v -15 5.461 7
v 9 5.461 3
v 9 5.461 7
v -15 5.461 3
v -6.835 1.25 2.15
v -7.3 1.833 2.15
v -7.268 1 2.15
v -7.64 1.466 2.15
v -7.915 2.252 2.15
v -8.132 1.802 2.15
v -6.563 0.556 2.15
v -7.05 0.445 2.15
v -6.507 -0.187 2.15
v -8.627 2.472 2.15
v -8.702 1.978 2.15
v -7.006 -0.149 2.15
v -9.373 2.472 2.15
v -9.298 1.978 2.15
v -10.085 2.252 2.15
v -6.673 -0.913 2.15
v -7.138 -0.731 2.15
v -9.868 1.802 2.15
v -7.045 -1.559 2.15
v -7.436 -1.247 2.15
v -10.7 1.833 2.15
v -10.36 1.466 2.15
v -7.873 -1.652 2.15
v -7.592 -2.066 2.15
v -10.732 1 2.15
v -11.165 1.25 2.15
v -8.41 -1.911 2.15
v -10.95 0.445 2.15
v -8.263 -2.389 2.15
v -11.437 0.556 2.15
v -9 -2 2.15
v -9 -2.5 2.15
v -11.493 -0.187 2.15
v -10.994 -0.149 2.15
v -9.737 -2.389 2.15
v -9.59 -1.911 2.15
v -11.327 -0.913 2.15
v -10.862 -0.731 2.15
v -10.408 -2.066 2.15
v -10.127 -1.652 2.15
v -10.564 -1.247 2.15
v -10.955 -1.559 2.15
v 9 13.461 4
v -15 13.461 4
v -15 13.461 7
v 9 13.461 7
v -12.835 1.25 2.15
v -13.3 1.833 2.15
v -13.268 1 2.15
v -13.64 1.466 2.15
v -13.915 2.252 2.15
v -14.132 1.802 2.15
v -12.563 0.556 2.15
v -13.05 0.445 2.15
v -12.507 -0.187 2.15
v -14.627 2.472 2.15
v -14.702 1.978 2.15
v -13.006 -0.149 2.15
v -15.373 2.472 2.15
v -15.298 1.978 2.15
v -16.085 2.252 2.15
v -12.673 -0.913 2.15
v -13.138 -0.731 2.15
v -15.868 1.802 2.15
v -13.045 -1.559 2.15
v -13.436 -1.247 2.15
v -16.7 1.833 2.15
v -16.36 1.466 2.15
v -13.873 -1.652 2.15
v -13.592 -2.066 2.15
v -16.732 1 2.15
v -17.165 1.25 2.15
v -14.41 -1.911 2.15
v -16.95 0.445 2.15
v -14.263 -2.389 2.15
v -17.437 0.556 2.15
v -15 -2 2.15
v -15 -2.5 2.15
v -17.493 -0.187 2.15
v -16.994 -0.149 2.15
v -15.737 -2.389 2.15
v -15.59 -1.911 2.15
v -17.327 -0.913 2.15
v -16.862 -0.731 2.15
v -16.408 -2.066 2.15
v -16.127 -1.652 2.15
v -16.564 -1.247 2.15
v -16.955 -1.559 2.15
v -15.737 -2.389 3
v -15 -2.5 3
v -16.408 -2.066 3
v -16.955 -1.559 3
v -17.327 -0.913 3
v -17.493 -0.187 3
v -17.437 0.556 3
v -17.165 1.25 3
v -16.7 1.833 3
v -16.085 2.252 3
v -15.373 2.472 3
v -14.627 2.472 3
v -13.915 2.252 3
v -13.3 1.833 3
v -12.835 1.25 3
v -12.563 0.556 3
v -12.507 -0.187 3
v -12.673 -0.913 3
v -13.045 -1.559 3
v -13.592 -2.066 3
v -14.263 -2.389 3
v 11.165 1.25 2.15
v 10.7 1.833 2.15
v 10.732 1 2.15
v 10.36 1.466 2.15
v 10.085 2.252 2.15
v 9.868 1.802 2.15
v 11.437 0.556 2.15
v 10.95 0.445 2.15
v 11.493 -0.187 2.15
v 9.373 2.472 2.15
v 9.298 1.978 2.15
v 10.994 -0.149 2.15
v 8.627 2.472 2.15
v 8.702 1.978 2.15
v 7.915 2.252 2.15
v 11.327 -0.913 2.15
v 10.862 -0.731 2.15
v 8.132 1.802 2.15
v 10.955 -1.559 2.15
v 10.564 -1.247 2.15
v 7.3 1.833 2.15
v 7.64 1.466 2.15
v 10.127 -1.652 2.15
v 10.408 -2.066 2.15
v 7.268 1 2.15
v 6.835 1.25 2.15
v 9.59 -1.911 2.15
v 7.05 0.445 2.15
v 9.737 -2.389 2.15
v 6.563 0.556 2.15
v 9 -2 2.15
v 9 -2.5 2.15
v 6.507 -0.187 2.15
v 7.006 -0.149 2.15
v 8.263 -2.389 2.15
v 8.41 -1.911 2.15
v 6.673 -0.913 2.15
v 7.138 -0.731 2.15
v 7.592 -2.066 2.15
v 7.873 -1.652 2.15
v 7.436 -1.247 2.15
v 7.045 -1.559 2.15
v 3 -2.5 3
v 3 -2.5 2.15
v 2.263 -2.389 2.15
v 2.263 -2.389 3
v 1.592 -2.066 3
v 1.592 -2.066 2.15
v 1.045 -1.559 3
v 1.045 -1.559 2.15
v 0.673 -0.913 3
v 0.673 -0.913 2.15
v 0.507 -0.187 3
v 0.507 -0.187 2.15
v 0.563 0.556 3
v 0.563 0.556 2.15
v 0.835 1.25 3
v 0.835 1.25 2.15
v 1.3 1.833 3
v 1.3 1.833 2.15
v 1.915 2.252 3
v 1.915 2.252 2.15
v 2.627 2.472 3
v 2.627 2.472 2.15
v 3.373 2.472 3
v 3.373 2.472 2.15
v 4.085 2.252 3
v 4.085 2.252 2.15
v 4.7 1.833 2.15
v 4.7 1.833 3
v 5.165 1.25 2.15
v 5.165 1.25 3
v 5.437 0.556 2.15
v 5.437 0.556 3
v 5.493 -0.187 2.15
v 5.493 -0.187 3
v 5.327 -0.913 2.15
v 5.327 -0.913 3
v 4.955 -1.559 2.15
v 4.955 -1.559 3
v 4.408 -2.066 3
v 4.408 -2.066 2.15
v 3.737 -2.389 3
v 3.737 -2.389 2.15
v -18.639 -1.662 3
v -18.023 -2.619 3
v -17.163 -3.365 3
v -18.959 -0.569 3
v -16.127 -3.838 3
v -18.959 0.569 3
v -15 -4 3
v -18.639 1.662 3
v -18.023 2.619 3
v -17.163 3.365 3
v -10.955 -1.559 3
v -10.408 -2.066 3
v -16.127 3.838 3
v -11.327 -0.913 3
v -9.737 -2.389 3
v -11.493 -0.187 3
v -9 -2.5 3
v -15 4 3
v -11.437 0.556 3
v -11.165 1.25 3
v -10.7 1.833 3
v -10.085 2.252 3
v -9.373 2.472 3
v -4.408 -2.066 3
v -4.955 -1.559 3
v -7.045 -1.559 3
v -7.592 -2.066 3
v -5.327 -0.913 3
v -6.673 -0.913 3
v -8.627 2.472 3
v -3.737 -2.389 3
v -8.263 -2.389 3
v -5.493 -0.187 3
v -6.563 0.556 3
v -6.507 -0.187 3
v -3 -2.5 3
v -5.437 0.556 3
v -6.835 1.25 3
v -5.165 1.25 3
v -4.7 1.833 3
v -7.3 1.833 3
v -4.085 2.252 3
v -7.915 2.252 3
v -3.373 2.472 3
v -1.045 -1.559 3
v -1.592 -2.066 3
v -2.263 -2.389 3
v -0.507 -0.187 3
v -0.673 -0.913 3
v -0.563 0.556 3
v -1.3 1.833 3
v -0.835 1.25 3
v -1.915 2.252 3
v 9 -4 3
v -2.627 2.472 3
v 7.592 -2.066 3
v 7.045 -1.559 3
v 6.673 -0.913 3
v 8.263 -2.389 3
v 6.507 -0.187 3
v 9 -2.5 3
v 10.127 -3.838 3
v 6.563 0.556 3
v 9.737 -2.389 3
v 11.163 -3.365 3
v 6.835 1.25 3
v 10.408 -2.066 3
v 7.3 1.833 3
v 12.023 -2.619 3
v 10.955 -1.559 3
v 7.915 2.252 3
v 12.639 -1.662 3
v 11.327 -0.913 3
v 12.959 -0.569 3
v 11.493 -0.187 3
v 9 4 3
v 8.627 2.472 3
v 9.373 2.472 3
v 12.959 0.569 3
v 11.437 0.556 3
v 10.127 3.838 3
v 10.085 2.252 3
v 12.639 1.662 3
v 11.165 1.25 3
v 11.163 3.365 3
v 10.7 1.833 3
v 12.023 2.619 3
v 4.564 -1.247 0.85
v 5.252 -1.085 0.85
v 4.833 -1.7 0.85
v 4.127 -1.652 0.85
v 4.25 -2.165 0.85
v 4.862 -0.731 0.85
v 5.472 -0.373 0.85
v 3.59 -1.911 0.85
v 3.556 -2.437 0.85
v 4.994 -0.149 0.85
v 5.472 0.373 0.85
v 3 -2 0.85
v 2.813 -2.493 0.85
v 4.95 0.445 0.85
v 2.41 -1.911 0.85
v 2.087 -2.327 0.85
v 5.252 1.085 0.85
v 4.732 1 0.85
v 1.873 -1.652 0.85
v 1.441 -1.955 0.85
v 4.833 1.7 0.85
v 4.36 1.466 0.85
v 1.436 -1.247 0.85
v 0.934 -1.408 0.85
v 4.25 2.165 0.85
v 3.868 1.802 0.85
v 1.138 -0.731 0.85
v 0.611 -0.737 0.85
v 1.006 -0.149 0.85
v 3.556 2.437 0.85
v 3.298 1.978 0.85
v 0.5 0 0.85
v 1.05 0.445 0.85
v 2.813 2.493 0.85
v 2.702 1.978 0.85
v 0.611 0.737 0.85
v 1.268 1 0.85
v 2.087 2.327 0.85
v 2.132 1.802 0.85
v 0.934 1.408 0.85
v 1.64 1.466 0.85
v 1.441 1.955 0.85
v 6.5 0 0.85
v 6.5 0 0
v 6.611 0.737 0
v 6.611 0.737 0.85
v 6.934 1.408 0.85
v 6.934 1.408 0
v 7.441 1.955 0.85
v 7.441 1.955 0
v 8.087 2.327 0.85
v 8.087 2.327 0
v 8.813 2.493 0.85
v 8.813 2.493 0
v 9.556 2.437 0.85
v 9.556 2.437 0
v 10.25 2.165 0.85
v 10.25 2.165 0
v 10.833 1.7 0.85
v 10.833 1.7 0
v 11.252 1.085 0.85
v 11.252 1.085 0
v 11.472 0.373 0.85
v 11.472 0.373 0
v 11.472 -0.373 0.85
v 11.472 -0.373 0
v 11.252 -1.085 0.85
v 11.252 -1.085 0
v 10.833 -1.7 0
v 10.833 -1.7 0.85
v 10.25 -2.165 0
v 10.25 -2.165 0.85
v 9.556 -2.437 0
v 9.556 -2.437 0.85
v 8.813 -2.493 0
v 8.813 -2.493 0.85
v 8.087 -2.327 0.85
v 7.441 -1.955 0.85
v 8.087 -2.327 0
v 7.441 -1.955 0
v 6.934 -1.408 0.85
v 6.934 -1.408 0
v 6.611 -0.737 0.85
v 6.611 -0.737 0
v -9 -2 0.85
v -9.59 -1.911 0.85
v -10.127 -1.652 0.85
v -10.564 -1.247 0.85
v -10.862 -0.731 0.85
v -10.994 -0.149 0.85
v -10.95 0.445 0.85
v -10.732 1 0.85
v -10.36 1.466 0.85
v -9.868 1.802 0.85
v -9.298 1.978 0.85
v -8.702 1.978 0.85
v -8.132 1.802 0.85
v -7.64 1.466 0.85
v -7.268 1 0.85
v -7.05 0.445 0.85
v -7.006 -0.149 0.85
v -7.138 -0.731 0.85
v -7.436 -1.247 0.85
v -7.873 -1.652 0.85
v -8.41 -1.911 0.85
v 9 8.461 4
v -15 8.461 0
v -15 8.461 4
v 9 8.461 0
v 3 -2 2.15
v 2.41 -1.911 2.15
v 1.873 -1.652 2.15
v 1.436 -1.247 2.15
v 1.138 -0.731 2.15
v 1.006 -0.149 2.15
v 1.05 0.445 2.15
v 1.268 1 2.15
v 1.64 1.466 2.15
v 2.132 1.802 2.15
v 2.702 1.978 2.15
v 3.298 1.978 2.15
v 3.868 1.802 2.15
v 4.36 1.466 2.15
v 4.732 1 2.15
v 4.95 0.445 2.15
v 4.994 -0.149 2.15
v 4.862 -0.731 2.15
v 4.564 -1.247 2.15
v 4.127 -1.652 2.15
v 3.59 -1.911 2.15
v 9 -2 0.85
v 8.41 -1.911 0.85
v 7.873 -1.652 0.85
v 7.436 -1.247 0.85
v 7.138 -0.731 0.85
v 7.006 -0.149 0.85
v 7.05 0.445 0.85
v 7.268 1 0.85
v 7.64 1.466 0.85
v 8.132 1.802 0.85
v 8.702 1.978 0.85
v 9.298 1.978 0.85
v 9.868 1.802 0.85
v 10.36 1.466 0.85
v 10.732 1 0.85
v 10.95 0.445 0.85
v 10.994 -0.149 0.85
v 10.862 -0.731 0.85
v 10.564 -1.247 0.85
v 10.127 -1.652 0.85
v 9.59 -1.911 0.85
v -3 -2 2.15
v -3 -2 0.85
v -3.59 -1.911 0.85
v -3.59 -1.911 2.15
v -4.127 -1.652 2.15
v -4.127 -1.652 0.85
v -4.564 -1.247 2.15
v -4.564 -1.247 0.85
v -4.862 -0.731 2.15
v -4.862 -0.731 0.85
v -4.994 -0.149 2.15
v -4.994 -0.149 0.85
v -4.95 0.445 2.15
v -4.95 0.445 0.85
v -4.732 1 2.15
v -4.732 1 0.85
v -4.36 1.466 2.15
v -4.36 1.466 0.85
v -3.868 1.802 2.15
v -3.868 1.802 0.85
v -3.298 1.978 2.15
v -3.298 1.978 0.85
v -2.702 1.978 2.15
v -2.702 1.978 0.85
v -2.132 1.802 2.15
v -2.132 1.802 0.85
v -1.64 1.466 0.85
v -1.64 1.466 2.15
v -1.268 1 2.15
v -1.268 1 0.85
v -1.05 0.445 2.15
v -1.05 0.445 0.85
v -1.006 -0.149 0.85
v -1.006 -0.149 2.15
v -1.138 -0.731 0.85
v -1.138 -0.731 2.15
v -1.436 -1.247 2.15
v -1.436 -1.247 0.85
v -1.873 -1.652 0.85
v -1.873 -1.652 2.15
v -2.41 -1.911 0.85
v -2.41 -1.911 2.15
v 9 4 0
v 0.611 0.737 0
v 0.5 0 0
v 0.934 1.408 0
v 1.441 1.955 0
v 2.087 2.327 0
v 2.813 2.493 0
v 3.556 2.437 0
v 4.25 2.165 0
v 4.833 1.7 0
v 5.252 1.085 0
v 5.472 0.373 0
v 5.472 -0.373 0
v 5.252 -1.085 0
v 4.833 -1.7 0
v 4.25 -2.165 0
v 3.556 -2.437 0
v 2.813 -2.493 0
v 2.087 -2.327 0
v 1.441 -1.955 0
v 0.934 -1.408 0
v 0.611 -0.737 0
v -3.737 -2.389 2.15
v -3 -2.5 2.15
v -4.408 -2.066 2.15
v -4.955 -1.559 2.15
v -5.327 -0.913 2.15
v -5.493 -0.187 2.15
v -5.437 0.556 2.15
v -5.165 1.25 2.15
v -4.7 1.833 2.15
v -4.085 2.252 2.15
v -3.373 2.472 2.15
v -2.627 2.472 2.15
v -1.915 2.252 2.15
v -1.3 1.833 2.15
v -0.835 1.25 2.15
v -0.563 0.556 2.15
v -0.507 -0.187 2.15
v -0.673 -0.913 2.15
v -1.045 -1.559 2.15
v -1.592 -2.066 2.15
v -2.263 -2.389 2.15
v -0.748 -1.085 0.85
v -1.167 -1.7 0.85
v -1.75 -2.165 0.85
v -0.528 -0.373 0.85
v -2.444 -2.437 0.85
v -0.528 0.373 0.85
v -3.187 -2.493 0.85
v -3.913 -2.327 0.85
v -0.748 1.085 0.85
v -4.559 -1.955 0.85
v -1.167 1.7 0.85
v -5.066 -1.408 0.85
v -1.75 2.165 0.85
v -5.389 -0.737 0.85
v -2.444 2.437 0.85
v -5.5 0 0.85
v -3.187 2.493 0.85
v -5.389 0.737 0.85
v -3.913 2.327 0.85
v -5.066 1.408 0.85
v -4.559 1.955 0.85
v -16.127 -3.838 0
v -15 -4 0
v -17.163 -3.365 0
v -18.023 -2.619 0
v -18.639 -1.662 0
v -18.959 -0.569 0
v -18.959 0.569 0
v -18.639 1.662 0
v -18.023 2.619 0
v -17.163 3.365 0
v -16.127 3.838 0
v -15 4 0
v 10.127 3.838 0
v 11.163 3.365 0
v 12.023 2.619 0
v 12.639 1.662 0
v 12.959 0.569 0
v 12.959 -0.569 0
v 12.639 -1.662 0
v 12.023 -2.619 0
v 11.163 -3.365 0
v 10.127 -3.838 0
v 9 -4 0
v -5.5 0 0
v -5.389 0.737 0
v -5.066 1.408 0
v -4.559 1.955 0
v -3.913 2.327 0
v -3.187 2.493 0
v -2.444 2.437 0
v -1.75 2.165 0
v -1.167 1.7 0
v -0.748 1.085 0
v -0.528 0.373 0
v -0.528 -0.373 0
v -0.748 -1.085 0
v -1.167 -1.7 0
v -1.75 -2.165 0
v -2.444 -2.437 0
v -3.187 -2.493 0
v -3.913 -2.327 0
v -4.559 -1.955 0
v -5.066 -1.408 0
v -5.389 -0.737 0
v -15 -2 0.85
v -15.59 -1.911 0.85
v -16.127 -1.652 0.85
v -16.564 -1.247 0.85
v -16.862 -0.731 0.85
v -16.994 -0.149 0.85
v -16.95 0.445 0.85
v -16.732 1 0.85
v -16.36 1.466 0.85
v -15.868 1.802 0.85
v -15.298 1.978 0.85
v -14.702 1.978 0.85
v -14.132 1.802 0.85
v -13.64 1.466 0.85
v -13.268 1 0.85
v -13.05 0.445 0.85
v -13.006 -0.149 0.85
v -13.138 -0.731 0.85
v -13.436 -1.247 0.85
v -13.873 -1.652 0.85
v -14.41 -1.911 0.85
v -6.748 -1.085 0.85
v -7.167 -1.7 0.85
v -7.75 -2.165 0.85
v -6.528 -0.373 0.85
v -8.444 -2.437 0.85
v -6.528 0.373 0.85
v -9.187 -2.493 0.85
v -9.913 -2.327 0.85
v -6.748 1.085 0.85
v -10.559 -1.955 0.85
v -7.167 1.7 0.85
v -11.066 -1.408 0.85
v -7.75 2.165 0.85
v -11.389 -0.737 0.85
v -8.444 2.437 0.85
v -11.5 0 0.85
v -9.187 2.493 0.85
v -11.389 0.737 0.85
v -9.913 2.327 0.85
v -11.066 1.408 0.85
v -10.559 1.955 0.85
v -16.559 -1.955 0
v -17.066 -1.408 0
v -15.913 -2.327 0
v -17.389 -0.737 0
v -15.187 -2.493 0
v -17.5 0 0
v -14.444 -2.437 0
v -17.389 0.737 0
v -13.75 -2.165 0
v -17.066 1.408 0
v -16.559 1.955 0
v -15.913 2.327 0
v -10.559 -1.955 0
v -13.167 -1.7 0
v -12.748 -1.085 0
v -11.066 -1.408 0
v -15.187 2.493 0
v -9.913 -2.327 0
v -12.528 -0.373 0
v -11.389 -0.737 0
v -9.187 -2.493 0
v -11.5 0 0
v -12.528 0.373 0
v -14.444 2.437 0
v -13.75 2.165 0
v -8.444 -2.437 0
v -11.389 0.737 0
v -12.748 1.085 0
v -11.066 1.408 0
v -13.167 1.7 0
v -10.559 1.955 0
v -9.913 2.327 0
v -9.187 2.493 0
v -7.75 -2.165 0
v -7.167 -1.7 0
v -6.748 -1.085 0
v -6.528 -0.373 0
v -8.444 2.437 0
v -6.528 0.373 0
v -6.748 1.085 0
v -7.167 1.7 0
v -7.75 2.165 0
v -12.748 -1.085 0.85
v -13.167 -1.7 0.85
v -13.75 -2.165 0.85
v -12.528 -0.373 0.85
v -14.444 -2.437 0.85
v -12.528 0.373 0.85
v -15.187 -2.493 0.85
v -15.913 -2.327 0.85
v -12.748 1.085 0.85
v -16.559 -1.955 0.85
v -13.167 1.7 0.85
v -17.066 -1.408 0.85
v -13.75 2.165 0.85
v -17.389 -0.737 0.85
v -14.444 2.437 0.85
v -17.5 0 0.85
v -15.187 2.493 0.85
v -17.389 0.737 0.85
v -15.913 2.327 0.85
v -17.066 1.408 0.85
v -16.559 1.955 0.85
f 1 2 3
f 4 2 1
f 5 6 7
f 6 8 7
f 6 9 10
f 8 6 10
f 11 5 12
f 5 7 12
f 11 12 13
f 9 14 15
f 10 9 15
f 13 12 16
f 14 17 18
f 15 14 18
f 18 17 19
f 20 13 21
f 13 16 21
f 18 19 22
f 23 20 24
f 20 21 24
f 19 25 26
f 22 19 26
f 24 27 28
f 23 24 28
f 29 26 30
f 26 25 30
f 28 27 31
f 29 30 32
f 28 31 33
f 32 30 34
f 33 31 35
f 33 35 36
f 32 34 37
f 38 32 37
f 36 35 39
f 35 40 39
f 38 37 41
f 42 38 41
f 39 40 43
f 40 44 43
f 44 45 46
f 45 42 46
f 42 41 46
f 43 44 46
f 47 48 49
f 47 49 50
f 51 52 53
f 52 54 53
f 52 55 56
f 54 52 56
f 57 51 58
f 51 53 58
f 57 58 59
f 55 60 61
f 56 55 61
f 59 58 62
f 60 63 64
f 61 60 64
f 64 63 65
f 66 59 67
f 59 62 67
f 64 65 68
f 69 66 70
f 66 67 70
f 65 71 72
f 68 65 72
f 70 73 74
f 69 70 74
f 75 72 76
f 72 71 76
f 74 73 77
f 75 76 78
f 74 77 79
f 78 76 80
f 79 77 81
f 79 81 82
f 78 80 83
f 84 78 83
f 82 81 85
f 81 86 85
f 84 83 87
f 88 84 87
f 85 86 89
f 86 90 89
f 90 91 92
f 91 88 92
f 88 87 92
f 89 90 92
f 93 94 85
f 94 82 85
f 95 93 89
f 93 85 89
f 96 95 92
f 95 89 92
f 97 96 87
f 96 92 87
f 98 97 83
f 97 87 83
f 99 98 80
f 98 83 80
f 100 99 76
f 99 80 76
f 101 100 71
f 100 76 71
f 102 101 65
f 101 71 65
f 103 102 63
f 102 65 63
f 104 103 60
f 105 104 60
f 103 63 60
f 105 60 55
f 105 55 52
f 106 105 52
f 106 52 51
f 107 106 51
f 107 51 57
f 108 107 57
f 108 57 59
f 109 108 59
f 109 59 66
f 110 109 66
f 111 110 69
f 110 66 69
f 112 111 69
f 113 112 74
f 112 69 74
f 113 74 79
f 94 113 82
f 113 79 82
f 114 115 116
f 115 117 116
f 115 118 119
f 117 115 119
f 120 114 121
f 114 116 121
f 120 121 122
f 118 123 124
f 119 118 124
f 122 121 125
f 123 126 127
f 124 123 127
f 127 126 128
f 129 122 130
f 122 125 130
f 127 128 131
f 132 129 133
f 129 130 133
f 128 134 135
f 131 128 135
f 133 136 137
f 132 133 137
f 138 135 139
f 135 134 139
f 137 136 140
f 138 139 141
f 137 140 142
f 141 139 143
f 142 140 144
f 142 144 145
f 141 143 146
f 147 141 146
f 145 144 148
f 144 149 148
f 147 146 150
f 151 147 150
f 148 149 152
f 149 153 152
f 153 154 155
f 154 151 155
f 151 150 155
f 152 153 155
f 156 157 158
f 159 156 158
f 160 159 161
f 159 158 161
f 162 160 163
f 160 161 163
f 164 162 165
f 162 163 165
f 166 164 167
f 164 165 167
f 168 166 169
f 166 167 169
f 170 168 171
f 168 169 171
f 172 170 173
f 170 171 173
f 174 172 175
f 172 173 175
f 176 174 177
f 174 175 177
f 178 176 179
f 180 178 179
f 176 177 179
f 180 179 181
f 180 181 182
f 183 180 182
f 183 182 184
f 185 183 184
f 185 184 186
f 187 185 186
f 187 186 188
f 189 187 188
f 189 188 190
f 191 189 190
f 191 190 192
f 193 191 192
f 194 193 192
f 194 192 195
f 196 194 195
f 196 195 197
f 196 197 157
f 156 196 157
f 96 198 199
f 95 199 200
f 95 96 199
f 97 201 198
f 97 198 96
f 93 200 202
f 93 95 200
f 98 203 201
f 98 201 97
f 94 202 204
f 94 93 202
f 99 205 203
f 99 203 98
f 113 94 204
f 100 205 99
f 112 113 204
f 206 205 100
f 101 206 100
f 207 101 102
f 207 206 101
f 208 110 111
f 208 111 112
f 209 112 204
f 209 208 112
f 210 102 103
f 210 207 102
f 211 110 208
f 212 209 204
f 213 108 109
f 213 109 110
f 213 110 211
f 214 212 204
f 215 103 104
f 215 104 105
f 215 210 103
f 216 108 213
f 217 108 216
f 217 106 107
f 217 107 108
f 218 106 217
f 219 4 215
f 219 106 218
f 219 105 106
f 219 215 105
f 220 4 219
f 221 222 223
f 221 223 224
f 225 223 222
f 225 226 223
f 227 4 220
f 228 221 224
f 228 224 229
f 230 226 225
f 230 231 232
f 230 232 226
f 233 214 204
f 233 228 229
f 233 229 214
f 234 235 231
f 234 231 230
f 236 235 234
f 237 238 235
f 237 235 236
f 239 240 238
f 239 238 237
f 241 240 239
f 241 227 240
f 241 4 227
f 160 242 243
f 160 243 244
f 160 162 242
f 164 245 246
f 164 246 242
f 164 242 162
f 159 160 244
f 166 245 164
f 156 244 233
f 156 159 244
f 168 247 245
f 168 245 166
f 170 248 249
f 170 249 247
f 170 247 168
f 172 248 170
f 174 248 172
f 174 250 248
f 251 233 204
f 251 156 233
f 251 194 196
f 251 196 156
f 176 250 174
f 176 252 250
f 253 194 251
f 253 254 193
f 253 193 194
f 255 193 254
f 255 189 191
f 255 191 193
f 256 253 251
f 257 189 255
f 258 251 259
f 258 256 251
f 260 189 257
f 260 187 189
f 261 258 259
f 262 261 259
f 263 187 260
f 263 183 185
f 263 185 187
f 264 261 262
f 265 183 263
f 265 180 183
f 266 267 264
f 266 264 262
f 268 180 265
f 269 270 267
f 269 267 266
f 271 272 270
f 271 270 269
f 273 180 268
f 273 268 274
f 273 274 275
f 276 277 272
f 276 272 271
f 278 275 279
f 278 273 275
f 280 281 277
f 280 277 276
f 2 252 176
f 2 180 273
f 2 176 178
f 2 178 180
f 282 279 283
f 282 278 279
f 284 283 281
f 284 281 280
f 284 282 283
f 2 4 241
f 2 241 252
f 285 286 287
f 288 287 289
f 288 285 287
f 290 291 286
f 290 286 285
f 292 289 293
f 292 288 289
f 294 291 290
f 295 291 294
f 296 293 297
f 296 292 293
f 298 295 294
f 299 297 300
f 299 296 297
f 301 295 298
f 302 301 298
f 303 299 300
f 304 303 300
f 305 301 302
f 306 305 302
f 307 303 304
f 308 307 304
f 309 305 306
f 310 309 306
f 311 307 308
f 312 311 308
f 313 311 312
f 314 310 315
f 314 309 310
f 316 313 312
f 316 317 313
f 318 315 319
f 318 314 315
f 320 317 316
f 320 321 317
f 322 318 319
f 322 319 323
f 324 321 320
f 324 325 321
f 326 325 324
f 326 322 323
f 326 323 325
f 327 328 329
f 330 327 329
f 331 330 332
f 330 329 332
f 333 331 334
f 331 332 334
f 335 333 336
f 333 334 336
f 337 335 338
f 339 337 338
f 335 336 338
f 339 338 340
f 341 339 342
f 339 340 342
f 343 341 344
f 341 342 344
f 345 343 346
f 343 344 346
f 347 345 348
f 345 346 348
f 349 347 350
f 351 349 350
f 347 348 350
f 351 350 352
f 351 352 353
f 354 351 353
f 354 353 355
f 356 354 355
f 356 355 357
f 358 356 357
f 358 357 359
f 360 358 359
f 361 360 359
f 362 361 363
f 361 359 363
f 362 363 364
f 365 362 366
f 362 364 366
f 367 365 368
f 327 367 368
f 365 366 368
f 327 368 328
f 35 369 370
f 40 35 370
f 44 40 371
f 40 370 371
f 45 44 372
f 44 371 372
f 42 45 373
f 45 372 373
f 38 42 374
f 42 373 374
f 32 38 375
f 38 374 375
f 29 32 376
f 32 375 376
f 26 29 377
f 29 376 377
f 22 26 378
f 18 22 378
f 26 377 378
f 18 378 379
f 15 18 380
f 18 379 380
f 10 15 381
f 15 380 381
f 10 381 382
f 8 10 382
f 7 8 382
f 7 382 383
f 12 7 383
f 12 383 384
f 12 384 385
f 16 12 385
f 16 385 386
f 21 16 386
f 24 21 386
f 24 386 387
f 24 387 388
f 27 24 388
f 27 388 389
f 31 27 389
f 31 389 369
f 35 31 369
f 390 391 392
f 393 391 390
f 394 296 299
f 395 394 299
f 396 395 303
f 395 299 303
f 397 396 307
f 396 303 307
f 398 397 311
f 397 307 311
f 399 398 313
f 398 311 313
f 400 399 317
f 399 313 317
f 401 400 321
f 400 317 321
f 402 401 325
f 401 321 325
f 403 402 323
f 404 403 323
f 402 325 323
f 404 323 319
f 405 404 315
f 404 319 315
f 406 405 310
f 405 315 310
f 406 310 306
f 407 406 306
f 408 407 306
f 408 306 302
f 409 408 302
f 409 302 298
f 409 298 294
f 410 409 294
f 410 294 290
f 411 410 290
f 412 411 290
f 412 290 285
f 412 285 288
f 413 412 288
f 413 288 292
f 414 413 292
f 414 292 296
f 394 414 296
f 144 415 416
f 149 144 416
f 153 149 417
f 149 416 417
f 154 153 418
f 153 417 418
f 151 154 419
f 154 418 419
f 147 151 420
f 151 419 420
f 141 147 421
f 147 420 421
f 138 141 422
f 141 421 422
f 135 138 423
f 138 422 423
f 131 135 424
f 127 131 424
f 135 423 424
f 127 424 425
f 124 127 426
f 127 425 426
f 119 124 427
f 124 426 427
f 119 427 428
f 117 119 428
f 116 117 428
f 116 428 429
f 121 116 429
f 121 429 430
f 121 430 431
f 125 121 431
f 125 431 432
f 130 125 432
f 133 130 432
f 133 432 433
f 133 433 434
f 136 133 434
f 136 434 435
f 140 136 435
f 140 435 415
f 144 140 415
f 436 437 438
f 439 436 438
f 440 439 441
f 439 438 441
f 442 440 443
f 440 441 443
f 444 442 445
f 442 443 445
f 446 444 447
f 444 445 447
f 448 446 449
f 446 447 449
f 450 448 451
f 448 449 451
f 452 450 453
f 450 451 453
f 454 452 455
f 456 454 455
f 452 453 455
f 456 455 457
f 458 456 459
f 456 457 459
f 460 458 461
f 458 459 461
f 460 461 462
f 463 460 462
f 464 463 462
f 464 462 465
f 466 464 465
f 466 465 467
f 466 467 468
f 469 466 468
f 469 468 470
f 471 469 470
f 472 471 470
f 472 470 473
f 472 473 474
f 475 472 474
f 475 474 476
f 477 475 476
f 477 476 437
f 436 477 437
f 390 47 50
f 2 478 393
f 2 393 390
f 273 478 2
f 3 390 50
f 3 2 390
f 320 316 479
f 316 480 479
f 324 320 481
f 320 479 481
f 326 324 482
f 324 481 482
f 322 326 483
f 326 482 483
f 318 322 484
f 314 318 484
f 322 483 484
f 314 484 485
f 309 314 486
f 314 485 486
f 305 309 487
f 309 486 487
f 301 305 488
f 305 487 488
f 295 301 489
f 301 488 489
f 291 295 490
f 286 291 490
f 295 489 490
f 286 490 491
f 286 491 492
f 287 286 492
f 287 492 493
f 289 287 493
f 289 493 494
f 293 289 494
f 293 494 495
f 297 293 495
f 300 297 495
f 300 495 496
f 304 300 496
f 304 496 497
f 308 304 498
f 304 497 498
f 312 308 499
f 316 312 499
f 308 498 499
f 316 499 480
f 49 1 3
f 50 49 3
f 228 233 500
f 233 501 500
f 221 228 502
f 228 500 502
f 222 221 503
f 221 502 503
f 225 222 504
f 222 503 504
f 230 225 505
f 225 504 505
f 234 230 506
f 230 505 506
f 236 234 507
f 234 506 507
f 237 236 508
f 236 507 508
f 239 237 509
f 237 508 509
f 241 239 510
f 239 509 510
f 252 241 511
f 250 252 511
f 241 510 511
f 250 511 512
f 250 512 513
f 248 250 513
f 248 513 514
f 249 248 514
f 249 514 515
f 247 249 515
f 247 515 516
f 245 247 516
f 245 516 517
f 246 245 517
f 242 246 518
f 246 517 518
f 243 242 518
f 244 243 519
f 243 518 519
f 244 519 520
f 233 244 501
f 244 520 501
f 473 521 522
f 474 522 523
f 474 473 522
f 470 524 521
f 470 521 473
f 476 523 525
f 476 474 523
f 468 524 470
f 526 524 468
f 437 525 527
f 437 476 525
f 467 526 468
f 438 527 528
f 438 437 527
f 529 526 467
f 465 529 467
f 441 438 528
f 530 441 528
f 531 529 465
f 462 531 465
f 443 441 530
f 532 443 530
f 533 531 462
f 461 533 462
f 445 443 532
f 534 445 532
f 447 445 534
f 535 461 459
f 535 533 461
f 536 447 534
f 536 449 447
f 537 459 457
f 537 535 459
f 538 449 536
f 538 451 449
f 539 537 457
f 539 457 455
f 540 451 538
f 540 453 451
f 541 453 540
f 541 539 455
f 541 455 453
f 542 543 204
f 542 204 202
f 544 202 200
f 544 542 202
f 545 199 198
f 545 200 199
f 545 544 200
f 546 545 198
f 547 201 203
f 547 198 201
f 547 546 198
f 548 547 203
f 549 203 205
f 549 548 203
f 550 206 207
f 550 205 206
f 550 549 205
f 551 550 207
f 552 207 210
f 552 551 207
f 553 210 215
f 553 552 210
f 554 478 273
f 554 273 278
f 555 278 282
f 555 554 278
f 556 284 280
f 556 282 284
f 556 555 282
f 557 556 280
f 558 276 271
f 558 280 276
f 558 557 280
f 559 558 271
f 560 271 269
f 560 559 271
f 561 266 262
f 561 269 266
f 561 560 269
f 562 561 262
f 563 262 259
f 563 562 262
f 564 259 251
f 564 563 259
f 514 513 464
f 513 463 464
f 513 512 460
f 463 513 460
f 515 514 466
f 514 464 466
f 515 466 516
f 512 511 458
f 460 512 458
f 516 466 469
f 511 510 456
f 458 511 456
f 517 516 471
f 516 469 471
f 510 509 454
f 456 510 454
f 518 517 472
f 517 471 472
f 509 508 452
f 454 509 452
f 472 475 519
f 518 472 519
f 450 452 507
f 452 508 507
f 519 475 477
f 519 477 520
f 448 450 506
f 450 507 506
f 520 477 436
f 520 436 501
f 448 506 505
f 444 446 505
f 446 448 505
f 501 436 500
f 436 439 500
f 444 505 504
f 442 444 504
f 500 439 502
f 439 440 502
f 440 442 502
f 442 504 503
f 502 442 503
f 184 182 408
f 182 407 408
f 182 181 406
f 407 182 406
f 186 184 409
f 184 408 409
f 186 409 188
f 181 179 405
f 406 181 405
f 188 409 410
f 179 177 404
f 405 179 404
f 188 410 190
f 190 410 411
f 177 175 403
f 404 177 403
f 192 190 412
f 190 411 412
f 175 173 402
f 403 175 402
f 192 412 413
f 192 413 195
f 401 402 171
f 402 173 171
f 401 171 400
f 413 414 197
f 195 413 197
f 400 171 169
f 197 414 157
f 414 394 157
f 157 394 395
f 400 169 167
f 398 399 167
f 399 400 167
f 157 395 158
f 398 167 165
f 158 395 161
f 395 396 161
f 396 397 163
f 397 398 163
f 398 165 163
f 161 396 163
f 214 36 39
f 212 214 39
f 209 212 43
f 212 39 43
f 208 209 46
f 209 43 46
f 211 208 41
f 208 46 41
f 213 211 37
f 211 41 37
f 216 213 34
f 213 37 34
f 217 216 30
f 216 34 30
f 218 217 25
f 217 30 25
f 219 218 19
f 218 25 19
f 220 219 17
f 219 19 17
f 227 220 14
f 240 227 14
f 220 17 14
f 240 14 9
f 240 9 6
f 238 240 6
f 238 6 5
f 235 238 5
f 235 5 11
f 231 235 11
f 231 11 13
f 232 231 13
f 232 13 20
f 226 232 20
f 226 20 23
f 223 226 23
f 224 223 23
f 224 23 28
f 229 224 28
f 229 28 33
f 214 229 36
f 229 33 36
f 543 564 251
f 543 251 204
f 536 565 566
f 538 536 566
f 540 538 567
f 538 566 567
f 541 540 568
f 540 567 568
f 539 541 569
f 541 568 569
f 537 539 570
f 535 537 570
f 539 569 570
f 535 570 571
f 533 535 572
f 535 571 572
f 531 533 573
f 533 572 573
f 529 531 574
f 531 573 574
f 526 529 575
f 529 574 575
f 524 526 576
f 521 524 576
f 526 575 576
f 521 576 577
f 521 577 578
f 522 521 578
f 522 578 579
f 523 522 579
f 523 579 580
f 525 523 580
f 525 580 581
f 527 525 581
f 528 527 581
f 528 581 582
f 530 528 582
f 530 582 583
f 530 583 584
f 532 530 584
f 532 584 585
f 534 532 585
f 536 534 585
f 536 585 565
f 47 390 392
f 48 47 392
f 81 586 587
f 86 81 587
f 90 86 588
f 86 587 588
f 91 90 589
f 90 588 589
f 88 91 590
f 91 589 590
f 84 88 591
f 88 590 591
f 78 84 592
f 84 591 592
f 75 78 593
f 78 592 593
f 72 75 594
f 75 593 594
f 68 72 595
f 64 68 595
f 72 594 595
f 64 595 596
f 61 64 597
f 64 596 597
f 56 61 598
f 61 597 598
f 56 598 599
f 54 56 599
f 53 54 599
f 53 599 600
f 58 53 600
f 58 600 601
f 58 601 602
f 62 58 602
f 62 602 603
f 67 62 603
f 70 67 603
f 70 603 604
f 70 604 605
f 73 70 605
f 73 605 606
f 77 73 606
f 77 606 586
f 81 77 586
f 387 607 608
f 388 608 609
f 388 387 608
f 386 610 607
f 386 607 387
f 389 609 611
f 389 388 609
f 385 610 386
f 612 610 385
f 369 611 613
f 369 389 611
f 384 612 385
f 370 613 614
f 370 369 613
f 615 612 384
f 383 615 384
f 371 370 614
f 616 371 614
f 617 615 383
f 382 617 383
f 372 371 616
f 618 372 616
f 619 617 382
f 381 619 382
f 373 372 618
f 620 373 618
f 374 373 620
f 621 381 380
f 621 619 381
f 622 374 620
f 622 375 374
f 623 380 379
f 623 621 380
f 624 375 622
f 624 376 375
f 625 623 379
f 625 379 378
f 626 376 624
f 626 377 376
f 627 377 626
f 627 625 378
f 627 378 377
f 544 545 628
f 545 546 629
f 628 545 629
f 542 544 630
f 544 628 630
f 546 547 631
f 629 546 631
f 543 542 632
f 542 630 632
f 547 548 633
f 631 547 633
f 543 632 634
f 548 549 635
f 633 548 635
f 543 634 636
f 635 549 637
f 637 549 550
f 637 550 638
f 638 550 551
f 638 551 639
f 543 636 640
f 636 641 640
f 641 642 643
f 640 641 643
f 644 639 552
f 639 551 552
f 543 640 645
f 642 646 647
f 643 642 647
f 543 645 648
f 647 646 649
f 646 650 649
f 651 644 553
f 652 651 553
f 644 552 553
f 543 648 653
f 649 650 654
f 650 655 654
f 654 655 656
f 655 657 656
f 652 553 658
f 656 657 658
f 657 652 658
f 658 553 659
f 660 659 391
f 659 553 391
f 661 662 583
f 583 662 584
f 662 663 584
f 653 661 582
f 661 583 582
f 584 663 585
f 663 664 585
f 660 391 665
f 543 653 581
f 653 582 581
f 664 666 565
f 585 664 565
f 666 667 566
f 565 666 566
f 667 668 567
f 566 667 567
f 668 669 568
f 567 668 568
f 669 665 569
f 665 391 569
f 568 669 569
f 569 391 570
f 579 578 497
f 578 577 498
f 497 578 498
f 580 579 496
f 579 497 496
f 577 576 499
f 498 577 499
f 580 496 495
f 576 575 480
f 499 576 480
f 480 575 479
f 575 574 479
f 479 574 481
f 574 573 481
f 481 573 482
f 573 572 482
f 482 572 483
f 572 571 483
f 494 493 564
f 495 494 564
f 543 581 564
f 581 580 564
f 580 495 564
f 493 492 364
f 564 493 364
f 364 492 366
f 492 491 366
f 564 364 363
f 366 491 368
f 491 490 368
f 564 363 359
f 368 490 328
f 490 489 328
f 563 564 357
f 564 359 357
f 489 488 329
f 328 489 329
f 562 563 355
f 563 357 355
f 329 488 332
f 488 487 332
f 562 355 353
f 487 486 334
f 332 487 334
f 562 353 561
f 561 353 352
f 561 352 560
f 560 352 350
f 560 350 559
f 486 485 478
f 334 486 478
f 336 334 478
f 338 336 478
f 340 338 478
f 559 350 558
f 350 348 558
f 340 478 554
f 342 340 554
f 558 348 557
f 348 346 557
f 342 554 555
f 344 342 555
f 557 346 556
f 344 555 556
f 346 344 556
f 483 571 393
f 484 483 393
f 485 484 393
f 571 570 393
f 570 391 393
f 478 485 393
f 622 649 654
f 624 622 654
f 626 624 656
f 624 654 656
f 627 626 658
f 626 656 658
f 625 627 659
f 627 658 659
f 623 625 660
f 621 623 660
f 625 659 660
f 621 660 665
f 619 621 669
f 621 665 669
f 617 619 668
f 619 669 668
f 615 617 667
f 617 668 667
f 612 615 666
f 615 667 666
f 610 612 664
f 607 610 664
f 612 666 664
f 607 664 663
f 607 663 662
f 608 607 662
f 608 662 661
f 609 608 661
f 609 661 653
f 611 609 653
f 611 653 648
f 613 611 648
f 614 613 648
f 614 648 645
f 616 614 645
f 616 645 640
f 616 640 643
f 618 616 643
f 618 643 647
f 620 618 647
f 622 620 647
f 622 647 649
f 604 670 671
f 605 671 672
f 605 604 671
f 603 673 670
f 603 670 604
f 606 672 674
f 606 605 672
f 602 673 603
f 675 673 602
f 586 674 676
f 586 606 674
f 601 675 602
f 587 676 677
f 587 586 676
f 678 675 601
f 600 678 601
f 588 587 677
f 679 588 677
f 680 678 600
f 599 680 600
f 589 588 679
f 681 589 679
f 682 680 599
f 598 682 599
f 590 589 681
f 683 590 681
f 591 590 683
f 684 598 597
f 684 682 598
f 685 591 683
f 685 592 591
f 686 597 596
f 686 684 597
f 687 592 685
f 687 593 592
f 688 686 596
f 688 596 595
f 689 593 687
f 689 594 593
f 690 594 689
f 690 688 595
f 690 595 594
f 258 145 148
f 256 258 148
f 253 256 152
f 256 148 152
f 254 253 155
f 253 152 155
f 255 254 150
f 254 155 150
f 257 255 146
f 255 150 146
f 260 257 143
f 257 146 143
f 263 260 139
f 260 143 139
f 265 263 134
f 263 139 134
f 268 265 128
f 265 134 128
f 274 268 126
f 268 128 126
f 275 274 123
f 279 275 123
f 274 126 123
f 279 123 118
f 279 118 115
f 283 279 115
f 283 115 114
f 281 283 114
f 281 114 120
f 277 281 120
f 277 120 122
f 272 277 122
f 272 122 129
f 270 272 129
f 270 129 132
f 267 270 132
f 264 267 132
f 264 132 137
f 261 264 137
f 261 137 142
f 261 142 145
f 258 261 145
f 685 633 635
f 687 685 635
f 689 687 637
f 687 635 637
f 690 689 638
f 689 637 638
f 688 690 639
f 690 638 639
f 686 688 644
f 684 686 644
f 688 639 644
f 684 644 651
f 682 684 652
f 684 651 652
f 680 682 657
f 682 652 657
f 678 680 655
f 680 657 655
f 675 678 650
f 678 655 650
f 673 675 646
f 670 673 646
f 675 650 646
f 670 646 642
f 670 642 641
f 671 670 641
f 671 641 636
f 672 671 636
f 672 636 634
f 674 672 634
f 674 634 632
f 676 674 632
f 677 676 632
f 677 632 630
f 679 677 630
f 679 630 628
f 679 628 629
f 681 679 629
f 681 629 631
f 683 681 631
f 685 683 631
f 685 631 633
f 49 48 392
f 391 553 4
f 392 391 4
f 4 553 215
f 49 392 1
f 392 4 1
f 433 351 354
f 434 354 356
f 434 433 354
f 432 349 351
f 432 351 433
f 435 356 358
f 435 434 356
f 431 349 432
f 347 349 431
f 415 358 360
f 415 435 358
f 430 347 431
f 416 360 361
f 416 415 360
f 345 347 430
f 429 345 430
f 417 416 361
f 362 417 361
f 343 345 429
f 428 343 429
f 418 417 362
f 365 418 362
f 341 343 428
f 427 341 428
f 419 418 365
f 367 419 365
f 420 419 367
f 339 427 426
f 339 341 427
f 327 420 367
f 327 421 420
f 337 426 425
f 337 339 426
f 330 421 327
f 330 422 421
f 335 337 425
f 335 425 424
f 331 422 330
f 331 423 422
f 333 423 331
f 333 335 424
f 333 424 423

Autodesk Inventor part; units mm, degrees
ref_plane "YZ Plane" through (0, 0, 0) normal (1, 0, 0) x (0, 1, 0)
ref_plane "XZ Plane" through (0, 0, 0) normal (0, 1, 0) x (-1, 0, 0)
ref_plane "XY Plane" through (0, 0, 0) normal (0, 0, 1) x (1, 0, 0)
sketch "Sketch1" plane through (0, 0, 0) normal (0, 0, 1) x (1, 0, 0)
  arc A0 (-15, 4) -> (-15, -4) centre (-15, 0) ccw
  line L0 (-5, -4) -> (-15, -4)
  line L1 (-3, 0) -> (-3, 5.2247) construction
  arc A1 (9, -4) -> (9, 4) centre (9, 0) ccw
  line L2 (-5, -4) -> (9, -4)
  line L3 (9, 8.4612) -> (-15, 8.4612)
  line L4 (-15, 8.4612) -> (-15, 4)
  line L5 (9, 4) -> (9, 8.4612)
  dimension "d11" = 4
extrude "Extrusion1" add sketch "Sketch1" along normal blind 3
sketch "Sketch2" plane through (0, 0, 3) normal (0, 0, 1) x (1, 0, 0)
  arc A0 (-15, 4) -> (-15, -4) centre (-15, 0) ccw projected
  point P0 (0, 0)
hole "Hole1" at (-15, 0, 3) direction (0, 0, -1) diameter 4 depth 3 tip angle 118 counterbore diameter 5 counterbore depth 0.85
sketch "Sketch5" plane through (0, 0, 0) normal (0, 0, -1) x (-1, 0, 0)
  circle A0 centre (15, 0) radius 2 projected
  circle A1 centre (15, 0) radius 2.5
  point P0 (0, 0)
extrude "Extrusion3" cut sketch "Sketch5" against normal blind 0.85
pattern_linear "Rectangular Pattern2" count 5 spacing 6 along (1, 0, 0) of "Extrusion3", "Hole1"
sketch "Sketch6" plane through (0, 0, 3) normal (0, 0, 1) x (1, 0, 0)
  point P0 (0, 0)
sketch "Sketch7" plane through (0, 0, 3) normal (0, 0, 1) x (1, 0, 0)
  line L0 (9, 4) -> (9, 8.4612) projected
  line L1 (-15, 8.4612) -> (9, 8.4612)
  line L2 (9, 8.4612) -> (9, 5.4612)
  line L3 (9, 5.4612) -> (-15, 5.4612)
  line L4 (-15, 5.4612) -> (-15, 8.4612)
  point P0 (0, 0)
  dimension "d24" = 3
extrude "Extrusion4" add sketch "Sketch7" along normal blind 4
sketch "Sketch8" plane through (-15, 8.4612, 0) normal (0, 1, 0) x (1, 0, 0)
  line L0 (24, -3) -> (24, -7) projected
  line L1 (0, -7) -> (24, -7)
  line L2 (24, -7) -> (24, -4)
  line L3 (24, -4) -> (0, -4)
  line L4 (0, -4) -> (0, -7)
  point P0 (15, 0)
  dimension "d27" = 3
extrude "Extrusion5" add sketch "Sketch8" along normal blind 5
properties part number "caster_pad"
